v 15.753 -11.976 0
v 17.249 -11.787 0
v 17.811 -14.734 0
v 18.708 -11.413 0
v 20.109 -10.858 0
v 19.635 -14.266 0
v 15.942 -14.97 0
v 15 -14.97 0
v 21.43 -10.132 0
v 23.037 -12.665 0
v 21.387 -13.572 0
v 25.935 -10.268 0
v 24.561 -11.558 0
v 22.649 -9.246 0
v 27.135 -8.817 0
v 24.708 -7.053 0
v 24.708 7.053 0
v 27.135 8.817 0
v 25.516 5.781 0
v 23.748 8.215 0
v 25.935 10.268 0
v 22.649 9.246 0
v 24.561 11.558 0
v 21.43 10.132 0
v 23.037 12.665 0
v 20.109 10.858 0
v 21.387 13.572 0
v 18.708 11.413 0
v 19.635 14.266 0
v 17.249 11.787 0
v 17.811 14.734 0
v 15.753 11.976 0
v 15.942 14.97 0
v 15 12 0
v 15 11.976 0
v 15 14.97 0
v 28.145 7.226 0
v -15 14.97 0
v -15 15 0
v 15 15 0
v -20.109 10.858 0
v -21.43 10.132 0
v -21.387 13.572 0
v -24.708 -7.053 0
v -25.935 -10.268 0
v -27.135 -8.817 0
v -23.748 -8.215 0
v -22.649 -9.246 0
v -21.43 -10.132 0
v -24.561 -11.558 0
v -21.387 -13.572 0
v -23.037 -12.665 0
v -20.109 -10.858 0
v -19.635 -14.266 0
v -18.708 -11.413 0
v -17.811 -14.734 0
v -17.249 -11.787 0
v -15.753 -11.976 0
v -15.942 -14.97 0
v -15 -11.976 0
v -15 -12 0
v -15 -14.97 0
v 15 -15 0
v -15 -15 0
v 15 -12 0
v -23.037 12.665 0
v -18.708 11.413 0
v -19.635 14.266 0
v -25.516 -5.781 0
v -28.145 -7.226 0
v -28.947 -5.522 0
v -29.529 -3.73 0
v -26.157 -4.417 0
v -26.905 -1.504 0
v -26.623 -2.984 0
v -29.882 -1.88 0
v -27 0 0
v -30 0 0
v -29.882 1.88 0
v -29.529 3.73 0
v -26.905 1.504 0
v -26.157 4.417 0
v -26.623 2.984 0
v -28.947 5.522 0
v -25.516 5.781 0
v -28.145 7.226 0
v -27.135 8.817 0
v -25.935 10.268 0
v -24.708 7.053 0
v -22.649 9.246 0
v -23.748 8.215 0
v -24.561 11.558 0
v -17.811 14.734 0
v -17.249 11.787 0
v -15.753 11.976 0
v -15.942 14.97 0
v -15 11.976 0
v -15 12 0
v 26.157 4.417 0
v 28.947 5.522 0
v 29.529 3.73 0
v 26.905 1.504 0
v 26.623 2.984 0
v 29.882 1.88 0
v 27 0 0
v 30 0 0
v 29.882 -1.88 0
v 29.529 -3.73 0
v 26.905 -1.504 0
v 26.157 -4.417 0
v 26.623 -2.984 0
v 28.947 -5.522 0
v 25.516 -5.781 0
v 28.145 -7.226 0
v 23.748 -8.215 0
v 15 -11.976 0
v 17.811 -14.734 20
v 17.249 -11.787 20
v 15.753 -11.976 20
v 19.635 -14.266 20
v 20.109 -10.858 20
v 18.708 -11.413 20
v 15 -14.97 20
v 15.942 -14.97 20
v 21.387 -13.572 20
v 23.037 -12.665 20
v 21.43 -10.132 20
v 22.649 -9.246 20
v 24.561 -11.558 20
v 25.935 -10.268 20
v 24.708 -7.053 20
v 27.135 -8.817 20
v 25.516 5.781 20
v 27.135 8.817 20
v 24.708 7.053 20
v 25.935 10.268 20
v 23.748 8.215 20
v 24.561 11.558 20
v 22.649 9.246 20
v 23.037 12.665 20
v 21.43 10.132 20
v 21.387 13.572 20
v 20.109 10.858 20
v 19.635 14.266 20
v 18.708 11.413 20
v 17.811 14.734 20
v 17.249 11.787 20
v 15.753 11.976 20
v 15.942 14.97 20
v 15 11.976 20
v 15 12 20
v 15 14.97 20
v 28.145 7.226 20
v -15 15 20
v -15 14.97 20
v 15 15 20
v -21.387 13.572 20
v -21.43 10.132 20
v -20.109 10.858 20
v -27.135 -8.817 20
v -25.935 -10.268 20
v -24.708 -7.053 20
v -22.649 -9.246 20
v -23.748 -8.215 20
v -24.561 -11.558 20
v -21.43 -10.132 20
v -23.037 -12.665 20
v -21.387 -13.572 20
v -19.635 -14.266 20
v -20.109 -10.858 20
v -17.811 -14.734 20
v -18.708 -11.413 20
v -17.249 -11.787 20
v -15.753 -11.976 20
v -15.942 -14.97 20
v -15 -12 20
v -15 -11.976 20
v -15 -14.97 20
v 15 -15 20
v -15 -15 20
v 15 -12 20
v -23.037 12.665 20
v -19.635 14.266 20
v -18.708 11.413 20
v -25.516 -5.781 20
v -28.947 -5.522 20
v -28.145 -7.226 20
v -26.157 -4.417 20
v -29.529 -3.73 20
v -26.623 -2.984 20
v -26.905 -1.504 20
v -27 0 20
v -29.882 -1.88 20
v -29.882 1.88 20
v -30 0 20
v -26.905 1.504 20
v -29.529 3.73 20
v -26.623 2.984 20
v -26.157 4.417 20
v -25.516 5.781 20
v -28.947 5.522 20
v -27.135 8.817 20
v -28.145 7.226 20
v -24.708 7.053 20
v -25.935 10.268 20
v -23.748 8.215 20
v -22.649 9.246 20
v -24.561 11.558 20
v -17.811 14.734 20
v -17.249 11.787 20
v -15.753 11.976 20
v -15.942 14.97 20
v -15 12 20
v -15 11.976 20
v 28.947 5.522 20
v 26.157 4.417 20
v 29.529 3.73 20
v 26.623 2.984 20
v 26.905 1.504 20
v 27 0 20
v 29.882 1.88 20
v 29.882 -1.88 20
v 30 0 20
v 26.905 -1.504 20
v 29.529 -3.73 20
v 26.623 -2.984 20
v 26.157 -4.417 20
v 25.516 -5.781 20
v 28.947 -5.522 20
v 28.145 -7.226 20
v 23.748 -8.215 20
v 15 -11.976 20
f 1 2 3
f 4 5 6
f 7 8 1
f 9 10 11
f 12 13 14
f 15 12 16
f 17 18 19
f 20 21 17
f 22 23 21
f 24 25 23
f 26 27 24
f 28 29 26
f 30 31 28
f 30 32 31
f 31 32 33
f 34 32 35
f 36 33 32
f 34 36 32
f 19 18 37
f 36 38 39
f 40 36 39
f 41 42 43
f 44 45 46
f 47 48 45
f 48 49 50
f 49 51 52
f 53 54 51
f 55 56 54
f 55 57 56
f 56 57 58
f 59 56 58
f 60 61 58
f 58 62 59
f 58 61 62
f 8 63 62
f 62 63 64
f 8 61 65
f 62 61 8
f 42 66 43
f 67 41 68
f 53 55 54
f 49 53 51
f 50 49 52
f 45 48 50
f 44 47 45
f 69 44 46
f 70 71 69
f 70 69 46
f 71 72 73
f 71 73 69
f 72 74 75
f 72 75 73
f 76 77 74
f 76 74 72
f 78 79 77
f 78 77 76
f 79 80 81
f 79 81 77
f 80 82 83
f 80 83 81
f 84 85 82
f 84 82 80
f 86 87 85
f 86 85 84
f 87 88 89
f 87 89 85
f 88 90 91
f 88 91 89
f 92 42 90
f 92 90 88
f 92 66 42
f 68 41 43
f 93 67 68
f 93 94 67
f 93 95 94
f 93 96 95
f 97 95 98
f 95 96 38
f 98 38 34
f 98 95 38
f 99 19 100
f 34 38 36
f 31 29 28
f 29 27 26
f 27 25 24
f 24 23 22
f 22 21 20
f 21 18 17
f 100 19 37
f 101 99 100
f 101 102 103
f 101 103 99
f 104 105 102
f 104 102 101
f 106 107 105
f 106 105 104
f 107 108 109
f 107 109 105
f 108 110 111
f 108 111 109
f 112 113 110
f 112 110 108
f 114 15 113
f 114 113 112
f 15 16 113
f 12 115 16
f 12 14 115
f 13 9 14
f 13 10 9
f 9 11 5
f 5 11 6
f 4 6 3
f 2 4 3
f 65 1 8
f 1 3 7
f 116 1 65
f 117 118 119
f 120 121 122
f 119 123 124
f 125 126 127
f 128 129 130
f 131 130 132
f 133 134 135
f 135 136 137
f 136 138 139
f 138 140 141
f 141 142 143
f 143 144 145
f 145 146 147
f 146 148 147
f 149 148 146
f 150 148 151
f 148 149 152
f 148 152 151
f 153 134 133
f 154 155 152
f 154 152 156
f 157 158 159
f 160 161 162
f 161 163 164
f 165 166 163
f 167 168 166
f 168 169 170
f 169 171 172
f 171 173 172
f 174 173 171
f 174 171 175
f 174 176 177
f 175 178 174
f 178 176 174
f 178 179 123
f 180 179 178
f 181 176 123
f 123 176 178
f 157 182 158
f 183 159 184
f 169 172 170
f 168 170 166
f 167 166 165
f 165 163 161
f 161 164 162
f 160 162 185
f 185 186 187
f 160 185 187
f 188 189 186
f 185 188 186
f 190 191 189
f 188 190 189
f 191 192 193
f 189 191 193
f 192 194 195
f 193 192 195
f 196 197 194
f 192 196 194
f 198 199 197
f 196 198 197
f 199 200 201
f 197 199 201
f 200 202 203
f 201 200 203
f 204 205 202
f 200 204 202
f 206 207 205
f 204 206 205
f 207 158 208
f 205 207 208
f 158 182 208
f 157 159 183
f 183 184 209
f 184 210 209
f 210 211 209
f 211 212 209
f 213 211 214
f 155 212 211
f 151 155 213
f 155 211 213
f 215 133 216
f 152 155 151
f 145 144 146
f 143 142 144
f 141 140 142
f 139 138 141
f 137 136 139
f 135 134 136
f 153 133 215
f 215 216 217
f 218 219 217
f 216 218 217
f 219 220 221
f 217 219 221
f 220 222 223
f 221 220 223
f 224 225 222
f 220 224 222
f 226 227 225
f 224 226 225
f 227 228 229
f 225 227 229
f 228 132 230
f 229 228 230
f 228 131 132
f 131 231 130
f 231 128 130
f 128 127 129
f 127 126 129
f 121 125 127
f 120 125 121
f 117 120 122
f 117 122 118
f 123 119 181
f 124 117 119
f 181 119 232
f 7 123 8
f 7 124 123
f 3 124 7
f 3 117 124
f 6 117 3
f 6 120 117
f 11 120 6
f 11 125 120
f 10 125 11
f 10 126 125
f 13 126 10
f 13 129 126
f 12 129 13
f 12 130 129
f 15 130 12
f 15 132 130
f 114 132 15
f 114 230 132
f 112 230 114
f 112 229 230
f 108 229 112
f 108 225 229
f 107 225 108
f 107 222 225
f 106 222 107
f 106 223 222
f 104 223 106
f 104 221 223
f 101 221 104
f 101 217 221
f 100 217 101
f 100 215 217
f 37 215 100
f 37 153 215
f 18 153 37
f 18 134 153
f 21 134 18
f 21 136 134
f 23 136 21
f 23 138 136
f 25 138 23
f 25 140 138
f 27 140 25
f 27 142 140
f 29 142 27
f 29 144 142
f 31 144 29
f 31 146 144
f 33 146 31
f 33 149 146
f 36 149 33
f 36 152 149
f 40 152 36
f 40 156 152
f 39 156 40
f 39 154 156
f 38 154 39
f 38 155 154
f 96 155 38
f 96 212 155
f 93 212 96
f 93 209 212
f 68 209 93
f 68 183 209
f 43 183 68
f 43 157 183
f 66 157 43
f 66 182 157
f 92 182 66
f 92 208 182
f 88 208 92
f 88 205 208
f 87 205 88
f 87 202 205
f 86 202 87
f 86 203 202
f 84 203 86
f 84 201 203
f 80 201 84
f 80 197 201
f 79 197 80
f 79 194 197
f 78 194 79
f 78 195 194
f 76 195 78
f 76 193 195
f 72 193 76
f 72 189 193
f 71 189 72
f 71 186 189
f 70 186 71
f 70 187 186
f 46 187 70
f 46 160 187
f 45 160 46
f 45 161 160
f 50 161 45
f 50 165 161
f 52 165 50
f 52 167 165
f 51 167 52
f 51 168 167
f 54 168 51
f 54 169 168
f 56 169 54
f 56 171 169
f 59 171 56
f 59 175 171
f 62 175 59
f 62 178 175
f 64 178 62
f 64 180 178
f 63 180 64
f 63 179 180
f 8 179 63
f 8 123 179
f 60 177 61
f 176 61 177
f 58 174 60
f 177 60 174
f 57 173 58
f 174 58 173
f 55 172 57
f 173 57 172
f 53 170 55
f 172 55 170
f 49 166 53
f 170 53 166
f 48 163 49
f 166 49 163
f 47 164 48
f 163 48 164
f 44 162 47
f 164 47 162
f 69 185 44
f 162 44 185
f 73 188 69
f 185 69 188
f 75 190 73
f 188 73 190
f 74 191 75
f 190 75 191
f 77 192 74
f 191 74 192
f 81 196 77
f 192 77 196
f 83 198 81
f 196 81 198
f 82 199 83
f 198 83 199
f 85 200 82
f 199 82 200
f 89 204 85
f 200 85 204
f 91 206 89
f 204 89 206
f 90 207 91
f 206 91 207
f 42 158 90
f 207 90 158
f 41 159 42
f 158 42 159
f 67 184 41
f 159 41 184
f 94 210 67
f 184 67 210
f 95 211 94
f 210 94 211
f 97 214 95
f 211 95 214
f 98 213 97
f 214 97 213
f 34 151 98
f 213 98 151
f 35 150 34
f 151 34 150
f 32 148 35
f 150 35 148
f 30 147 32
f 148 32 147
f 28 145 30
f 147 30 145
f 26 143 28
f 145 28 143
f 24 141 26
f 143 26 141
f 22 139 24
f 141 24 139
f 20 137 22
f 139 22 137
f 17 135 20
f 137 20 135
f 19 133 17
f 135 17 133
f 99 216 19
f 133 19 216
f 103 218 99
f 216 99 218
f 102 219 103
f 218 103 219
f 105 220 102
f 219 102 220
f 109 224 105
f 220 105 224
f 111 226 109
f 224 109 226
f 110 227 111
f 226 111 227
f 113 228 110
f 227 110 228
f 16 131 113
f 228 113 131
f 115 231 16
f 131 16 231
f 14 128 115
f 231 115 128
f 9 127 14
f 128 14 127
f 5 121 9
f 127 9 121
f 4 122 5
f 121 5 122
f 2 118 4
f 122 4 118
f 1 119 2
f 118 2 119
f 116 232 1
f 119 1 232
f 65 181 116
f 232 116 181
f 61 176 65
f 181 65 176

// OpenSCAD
$fn=50;

module slot(width, height) {
    $diameter = height;
    $square_width = width - $diameter;
    
    union() {
        translate([-$square_width/2, 0, 0])
        circle(d=$diameter);
        
        square([$square_width, height], center=true);
        
        translate([$square_width/2, 0, 0])
        circle(d=$diameter);
    }
}

module slot_border(outer_width, outer_height, thickness) {
    difference() {
        slot(outer_width, outer_height);
        slot(outer_width - 2*thickness, outer_height - 2*thickness);
    }
}


linear_extrude(20)
slot_border(60, 30, 3);
